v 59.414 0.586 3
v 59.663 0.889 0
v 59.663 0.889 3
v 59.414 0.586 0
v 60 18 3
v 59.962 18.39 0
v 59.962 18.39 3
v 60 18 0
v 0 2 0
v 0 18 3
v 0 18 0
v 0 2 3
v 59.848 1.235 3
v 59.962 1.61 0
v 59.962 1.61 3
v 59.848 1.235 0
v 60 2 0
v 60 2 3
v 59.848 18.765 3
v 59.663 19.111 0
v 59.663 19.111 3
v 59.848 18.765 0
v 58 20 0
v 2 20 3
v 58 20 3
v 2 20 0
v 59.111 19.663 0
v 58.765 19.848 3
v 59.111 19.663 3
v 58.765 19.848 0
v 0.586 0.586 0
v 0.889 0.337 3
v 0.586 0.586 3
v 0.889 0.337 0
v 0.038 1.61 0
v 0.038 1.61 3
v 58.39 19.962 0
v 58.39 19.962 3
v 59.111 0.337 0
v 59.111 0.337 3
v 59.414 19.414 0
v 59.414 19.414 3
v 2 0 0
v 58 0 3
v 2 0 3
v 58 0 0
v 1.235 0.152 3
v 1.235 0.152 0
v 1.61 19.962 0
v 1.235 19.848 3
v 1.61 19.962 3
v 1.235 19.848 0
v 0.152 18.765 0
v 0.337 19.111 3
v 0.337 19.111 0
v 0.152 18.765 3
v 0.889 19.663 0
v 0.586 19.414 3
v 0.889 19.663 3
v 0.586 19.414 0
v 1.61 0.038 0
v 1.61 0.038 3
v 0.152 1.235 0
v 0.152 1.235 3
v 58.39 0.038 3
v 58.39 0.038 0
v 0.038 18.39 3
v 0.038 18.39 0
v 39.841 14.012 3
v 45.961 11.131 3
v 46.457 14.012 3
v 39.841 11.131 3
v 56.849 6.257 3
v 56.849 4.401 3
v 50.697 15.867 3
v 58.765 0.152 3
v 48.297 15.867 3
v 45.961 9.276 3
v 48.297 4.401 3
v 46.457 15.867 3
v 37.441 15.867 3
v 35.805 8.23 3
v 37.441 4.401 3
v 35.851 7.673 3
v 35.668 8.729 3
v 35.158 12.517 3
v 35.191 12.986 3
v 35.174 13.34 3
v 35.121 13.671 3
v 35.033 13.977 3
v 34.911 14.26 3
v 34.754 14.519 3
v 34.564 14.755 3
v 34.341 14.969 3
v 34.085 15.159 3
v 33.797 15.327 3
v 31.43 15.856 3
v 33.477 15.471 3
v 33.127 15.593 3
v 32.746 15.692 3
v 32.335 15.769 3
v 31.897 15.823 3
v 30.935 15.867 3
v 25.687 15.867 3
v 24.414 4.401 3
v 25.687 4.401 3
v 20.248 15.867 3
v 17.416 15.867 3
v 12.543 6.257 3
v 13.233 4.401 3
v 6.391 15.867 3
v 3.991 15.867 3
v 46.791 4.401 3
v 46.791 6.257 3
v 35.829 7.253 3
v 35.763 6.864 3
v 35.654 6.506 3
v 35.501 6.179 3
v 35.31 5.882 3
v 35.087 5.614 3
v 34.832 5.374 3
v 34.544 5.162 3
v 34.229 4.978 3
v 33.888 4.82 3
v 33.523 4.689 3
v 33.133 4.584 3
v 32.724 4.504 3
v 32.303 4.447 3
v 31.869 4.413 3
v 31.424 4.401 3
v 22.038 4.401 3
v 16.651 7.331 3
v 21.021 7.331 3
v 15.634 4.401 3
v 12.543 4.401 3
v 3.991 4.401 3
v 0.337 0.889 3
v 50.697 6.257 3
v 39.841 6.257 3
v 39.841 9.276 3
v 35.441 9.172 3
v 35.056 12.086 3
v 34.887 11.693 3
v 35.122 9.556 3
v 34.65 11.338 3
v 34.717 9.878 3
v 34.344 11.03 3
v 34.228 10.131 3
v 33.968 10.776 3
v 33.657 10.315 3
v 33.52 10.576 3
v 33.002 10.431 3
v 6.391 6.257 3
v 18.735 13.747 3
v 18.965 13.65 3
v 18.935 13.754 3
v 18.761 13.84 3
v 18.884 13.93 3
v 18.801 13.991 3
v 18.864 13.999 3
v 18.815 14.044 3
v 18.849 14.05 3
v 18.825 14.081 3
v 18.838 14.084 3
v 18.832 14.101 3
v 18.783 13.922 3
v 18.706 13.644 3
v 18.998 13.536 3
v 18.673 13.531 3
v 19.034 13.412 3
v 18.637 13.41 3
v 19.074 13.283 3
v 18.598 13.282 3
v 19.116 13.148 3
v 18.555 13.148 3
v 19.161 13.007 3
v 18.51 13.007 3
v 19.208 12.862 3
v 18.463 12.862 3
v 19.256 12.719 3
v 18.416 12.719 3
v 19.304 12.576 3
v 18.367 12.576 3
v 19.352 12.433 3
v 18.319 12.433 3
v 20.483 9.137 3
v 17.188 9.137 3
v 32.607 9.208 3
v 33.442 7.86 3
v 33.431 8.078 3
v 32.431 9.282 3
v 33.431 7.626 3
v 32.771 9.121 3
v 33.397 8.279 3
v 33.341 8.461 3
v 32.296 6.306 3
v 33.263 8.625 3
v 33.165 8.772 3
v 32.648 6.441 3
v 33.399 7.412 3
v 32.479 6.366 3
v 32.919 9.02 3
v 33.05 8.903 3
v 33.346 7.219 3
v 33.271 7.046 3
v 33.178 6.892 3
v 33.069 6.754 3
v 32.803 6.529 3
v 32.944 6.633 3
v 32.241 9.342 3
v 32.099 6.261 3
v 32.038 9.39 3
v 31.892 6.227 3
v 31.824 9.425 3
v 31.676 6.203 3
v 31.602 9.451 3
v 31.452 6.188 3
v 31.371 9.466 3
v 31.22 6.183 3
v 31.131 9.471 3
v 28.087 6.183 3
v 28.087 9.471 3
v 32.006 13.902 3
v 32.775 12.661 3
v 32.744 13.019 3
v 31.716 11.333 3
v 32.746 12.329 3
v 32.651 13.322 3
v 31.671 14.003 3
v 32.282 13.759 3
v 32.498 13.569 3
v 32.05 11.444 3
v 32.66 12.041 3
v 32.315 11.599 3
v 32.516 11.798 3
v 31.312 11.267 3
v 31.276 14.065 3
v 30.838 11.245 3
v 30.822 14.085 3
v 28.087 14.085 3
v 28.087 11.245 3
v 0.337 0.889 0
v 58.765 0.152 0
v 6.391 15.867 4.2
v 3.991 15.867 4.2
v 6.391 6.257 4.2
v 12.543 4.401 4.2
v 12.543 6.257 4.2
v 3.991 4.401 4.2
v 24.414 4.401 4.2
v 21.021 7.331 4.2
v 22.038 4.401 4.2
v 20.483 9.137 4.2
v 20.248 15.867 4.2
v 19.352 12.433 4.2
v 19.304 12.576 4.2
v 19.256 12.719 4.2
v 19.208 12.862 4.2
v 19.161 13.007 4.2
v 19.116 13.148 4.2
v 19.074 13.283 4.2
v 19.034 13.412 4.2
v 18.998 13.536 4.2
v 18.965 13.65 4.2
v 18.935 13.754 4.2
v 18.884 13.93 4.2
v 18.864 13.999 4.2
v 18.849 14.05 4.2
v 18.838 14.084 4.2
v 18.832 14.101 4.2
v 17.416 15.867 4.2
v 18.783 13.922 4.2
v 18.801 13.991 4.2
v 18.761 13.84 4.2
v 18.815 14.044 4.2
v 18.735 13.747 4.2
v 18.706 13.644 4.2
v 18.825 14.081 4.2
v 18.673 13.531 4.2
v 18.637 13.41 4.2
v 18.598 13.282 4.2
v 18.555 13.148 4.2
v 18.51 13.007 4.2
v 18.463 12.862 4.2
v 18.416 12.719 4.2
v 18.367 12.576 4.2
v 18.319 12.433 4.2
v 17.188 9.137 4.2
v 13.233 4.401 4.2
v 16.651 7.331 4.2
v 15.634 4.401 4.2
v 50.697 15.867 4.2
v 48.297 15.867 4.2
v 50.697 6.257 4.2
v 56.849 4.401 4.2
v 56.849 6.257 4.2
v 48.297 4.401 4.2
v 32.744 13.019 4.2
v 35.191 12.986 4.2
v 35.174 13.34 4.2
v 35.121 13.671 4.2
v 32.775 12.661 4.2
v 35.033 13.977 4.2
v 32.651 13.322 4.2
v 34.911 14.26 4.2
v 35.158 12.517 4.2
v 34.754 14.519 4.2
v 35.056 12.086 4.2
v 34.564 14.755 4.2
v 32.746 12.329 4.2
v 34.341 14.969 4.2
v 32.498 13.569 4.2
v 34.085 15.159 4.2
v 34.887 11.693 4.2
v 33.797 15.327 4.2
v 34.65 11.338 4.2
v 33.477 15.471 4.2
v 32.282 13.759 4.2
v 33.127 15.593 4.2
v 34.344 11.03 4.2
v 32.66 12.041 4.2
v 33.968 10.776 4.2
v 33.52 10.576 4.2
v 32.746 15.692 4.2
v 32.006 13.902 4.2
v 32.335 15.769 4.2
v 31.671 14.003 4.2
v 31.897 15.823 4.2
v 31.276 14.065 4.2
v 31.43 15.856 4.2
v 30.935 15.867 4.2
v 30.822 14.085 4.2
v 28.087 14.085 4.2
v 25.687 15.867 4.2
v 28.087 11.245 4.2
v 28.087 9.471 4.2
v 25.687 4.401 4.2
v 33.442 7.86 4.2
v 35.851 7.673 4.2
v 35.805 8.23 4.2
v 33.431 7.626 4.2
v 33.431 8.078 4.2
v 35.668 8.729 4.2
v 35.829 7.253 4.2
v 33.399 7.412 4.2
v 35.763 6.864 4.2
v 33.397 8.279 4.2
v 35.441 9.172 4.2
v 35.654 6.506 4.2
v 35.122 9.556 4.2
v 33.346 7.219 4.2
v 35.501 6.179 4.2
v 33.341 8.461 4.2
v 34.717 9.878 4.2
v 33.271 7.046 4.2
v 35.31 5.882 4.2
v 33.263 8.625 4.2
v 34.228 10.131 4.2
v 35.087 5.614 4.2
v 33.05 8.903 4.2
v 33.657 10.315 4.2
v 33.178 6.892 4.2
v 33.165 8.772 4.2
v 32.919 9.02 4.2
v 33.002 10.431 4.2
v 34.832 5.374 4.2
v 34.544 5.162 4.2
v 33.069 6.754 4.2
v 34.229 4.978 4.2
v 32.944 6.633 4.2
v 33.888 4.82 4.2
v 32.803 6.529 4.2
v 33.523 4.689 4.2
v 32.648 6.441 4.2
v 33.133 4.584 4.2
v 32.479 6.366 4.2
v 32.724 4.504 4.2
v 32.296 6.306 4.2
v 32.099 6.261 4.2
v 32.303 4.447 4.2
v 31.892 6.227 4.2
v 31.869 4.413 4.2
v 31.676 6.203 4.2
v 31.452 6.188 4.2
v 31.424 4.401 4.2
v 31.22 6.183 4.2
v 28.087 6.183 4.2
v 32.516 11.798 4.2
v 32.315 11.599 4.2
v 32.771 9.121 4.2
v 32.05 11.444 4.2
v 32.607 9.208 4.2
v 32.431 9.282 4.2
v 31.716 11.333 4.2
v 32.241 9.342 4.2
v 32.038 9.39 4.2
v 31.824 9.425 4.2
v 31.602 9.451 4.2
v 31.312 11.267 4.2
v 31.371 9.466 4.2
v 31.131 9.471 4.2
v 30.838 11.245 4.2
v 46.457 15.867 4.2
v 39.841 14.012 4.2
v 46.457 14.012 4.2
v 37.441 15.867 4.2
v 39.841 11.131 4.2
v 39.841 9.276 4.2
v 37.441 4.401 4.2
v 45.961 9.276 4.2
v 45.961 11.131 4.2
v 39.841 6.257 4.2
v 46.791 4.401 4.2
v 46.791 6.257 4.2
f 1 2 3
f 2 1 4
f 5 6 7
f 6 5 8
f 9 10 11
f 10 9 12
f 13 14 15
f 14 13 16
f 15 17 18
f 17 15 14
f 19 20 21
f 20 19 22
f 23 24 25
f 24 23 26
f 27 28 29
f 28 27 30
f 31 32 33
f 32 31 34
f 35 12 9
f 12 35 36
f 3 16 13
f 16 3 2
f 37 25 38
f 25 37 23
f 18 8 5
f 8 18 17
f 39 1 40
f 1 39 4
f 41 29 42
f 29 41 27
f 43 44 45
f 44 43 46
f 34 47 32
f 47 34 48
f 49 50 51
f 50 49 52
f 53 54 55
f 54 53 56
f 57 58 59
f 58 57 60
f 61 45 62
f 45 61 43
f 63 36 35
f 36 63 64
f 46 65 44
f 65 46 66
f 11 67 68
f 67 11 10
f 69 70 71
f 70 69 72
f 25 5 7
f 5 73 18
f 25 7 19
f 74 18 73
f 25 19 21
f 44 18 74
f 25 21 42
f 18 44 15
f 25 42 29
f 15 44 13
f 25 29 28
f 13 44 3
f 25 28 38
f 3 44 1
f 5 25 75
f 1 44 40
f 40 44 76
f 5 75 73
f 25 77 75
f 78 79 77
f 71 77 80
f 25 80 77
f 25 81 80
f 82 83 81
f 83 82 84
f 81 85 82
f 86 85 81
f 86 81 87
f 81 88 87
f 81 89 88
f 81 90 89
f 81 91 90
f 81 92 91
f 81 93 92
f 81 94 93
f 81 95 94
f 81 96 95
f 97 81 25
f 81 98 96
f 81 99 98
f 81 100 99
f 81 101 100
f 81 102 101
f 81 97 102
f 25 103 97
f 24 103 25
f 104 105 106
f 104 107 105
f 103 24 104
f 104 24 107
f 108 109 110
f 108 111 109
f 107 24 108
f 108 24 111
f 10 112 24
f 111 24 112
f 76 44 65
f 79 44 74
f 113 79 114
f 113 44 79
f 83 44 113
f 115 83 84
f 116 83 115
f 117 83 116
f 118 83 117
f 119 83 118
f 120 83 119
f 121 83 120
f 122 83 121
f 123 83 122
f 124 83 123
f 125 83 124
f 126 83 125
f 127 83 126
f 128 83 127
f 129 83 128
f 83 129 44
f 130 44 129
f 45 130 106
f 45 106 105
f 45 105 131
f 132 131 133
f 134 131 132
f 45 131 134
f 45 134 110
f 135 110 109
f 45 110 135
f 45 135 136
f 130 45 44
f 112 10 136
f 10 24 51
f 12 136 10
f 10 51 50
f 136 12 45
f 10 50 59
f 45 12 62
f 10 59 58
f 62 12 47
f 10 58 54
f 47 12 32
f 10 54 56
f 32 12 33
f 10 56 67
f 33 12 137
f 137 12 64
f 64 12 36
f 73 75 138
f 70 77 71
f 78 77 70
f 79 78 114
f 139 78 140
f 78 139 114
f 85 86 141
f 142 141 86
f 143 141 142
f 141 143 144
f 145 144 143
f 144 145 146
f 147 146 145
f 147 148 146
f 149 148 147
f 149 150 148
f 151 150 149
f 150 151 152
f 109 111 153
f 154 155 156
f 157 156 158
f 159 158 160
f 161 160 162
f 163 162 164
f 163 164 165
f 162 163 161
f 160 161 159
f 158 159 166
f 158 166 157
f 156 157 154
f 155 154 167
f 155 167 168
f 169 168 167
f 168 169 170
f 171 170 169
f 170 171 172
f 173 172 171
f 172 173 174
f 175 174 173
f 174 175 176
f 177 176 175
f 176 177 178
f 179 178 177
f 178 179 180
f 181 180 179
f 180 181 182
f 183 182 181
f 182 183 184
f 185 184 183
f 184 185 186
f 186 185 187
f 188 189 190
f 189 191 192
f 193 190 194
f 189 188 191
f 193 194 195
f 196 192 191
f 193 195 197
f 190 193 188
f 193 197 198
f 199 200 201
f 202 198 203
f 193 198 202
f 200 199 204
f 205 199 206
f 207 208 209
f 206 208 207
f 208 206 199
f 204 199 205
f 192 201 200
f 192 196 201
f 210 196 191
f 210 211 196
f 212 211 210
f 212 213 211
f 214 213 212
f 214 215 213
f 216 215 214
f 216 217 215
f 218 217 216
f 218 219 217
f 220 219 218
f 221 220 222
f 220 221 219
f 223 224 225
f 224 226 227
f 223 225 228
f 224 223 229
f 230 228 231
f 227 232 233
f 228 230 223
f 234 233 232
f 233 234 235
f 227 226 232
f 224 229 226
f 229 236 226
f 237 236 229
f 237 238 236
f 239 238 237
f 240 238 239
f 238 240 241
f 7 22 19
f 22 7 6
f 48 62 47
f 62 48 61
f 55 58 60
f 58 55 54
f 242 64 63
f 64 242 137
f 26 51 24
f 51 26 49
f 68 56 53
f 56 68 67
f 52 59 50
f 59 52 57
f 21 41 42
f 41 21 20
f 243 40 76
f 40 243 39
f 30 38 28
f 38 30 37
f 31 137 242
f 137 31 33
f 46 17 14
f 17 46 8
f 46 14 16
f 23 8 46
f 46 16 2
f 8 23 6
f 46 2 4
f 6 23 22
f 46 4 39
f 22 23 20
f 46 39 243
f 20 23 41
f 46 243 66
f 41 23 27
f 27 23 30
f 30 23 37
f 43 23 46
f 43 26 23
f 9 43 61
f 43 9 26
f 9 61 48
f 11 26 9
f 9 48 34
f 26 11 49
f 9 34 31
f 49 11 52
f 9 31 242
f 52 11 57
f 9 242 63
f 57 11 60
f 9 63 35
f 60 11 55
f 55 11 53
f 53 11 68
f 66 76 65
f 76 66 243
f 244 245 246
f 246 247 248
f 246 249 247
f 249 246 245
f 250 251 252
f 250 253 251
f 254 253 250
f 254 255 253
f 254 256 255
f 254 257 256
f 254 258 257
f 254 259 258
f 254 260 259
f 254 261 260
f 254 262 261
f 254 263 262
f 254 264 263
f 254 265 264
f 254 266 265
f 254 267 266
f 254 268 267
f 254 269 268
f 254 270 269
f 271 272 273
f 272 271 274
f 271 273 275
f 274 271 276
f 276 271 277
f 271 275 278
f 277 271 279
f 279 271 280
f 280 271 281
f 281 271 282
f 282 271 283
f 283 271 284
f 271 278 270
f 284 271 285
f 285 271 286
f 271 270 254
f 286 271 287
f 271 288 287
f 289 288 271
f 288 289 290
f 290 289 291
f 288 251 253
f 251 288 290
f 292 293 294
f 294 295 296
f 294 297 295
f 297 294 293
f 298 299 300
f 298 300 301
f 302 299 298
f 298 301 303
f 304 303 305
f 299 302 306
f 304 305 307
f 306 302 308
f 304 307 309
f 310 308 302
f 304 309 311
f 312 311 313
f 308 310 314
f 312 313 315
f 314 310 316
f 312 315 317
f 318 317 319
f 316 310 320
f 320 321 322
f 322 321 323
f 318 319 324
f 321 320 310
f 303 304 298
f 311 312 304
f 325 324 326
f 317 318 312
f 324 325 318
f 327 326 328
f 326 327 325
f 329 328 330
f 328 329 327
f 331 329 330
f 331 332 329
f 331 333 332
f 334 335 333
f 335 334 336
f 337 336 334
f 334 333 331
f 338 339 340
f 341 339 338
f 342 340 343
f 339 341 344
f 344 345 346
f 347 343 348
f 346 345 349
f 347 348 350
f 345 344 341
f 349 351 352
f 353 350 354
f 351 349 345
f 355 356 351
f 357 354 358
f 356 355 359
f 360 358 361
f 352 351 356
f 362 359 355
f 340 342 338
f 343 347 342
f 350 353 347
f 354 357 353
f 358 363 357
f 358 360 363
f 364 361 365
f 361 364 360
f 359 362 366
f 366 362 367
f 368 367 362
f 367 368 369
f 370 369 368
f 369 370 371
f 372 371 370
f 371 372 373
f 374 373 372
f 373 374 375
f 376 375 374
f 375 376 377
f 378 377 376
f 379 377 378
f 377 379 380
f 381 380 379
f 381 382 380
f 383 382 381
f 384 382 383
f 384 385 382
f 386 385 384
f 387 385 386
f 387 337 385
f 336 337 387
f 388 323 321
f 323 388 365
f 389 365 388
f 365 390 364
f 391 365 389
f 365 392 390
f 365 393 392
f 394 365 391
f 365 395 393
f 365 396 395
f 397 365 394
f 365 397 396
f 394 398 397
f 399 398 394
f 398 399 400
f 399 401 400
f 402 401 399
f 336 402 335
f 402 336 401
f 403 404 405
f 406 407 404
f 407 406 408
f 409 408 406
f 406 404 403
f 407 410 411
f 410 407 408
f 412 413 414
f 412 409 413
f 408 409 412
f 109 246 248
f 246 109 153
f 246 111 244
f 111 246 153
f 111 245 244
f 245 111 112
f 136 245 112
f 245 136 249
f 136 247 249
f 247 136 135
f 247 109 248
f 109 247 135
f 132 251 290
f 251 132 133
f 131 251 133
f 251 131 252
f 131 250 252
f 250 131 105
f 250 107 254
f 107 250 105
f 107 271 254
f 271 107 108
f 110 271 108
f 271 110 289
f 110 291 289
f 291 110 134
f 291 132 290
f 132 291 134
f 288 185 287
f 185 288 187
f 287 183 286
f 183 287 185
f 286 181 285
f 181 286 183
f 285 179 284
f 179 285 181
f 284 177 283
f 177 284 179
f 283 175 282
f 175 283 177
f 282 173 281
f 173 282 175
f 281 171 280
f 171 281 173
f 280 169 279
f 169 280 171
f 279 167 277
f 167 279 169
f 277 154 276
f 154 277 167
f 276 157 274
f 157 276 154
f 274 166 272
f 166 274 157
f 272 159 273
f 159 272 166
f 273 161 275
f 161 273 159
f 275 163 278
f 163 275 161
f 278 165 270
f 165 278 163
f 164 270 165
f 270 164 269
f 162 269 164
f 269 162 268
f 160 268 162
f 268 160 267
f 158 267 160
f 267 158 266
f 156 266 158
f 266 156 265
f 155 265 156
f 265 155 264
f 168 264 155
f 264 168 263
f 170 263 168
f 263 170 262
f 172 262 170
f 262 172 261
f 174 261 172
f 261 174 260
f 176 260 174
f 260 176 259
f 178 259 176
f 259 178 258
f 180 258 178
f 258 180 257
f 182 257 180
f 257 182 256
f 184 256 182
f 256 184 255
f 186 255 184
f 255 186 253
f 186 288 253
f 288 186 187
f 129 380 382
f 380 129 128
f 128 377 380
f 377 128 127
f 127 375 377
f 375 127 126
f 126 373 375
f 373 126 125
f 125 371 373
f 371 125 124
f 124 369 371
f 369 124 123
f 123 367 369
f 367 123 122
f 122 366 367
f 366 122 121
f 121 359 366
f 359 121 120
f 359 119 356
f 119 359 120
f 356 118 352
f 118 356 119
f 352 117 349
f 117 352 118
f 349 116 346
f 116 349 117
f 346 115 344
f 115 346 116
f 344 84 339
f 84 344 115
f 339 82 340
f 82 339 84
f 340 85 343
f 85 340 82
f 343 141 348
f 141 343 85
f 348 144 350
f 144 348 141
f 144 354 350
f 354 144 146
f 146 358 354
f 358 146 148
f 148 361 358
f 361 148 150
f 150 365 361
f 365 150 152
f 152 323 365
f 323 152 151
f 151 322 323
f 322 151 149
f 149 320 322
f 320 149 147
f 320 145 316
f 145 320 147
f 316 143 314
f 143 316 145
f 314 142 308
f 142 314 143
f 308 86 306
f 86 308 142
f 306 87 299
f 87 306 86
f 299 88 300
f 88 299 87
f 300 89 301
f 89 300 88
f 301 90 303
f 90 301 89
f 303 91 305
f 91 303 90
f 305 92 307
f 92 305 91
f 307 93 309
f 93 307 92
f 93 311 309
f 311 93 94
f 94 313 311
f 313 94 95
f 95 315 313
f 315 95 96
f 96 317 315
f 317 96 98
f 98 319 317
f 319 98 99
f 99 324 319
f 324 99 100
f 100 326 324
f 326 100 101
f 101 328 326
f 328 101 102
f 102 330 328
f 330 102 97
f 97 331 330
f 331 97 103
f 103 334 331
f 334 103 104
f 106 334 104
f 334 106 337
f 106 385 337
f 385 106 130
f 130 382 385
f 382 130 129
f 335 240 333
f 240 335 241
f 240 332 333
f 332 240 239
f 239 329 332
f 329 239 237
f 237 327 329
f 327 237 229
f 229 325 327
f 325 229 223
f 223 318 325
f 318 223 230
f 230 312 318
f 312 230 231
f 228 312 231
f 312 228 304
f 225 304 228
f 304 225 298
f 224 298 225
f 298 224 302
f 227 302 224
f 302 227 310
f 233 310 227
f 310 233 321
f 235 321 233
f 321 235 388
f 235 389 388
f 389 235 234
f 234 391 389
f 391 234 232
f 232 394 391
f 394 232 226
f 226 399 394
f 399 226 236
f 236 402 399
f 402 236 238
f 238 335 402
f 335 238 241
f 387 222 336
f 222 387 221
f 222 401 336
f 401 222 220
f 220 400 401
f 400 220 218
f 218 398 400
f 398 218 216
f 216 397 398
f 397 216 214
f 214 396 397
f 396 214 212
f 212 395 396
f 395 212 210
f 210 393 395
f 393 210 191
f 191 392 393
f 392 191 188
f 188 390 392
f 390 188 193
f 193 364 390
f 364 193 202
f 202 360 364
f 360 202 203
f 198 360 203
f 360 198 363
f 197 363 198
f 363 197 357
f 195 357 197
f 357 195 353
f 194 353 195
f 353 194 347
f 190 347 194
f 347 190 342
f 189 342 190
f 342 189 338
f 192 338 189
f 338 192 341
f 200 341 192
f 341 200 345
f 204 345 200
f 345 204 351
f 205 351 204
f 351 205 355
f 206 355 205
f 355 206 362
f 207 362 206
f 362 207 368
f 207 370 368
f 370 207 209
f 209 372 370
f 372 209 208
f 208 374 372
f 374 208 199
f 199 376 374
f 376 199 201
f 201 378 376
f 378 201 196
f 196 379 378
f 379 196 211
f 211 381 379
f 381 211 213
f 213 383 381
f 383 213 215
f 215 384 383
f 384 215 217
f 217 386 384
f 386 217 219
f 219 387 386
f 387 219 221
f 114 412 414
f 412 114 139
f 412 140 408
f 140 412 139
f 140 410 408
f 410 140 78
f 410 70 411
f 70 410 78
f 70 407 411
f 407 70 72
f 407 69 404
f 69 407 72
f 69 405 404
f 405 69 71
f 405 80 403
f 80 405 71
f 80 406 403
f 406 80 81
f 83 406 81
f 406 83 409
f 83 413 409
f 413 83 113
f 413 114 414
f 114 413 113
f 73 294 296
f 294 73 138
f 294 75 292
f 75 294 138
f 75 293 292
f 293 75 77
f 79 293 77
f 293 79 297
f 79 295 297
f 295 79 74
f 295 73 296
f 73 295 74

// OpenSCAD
// DAVIS — Parametric Label
// Parameters injected by text_gen.py via OpenSCAD -D flag

label_text  = "LABEL";    // text to emboss
width       = 60;         // mm
height      = 20;         // mm
depth       = 3;          // mm (base thickness)
text_depth  = 1.2;        // mm emboss depth
font_size   = 0;          // 0 = auto-fit
border      = 2;          // mm border around text
corner_r    = 2;          // corner radius

_font_size = font_size > 0 ? font_size : (height - border * 2) * 0.75;

module rounded_rect(w, h, d, r) {
    hull() {
        translate([ r,  r, 0]) cylinder(r=r, h=d, $fn=32);
        translate([w-r,  r, 0]) cylinder(r=r, h=d, $fn=32);
        translate([ r, h-r, 0]) cylinder(r=r, h=d, $fn=32);
        translate([w-r, h-r, 0]) cylinder(r=r, h=d, $fn=32);
    }
}

difference() {
    rounded_rect(width, height, depth, corner_r);
}

// Embossed text
translate([width/2, height/2, depth])
    linear_extrude(height=text_depth)
        text(label_text,
             size=_font_size,
             font="Liberation Sans:style=Bold",
             halign="center",
             valign="center");
